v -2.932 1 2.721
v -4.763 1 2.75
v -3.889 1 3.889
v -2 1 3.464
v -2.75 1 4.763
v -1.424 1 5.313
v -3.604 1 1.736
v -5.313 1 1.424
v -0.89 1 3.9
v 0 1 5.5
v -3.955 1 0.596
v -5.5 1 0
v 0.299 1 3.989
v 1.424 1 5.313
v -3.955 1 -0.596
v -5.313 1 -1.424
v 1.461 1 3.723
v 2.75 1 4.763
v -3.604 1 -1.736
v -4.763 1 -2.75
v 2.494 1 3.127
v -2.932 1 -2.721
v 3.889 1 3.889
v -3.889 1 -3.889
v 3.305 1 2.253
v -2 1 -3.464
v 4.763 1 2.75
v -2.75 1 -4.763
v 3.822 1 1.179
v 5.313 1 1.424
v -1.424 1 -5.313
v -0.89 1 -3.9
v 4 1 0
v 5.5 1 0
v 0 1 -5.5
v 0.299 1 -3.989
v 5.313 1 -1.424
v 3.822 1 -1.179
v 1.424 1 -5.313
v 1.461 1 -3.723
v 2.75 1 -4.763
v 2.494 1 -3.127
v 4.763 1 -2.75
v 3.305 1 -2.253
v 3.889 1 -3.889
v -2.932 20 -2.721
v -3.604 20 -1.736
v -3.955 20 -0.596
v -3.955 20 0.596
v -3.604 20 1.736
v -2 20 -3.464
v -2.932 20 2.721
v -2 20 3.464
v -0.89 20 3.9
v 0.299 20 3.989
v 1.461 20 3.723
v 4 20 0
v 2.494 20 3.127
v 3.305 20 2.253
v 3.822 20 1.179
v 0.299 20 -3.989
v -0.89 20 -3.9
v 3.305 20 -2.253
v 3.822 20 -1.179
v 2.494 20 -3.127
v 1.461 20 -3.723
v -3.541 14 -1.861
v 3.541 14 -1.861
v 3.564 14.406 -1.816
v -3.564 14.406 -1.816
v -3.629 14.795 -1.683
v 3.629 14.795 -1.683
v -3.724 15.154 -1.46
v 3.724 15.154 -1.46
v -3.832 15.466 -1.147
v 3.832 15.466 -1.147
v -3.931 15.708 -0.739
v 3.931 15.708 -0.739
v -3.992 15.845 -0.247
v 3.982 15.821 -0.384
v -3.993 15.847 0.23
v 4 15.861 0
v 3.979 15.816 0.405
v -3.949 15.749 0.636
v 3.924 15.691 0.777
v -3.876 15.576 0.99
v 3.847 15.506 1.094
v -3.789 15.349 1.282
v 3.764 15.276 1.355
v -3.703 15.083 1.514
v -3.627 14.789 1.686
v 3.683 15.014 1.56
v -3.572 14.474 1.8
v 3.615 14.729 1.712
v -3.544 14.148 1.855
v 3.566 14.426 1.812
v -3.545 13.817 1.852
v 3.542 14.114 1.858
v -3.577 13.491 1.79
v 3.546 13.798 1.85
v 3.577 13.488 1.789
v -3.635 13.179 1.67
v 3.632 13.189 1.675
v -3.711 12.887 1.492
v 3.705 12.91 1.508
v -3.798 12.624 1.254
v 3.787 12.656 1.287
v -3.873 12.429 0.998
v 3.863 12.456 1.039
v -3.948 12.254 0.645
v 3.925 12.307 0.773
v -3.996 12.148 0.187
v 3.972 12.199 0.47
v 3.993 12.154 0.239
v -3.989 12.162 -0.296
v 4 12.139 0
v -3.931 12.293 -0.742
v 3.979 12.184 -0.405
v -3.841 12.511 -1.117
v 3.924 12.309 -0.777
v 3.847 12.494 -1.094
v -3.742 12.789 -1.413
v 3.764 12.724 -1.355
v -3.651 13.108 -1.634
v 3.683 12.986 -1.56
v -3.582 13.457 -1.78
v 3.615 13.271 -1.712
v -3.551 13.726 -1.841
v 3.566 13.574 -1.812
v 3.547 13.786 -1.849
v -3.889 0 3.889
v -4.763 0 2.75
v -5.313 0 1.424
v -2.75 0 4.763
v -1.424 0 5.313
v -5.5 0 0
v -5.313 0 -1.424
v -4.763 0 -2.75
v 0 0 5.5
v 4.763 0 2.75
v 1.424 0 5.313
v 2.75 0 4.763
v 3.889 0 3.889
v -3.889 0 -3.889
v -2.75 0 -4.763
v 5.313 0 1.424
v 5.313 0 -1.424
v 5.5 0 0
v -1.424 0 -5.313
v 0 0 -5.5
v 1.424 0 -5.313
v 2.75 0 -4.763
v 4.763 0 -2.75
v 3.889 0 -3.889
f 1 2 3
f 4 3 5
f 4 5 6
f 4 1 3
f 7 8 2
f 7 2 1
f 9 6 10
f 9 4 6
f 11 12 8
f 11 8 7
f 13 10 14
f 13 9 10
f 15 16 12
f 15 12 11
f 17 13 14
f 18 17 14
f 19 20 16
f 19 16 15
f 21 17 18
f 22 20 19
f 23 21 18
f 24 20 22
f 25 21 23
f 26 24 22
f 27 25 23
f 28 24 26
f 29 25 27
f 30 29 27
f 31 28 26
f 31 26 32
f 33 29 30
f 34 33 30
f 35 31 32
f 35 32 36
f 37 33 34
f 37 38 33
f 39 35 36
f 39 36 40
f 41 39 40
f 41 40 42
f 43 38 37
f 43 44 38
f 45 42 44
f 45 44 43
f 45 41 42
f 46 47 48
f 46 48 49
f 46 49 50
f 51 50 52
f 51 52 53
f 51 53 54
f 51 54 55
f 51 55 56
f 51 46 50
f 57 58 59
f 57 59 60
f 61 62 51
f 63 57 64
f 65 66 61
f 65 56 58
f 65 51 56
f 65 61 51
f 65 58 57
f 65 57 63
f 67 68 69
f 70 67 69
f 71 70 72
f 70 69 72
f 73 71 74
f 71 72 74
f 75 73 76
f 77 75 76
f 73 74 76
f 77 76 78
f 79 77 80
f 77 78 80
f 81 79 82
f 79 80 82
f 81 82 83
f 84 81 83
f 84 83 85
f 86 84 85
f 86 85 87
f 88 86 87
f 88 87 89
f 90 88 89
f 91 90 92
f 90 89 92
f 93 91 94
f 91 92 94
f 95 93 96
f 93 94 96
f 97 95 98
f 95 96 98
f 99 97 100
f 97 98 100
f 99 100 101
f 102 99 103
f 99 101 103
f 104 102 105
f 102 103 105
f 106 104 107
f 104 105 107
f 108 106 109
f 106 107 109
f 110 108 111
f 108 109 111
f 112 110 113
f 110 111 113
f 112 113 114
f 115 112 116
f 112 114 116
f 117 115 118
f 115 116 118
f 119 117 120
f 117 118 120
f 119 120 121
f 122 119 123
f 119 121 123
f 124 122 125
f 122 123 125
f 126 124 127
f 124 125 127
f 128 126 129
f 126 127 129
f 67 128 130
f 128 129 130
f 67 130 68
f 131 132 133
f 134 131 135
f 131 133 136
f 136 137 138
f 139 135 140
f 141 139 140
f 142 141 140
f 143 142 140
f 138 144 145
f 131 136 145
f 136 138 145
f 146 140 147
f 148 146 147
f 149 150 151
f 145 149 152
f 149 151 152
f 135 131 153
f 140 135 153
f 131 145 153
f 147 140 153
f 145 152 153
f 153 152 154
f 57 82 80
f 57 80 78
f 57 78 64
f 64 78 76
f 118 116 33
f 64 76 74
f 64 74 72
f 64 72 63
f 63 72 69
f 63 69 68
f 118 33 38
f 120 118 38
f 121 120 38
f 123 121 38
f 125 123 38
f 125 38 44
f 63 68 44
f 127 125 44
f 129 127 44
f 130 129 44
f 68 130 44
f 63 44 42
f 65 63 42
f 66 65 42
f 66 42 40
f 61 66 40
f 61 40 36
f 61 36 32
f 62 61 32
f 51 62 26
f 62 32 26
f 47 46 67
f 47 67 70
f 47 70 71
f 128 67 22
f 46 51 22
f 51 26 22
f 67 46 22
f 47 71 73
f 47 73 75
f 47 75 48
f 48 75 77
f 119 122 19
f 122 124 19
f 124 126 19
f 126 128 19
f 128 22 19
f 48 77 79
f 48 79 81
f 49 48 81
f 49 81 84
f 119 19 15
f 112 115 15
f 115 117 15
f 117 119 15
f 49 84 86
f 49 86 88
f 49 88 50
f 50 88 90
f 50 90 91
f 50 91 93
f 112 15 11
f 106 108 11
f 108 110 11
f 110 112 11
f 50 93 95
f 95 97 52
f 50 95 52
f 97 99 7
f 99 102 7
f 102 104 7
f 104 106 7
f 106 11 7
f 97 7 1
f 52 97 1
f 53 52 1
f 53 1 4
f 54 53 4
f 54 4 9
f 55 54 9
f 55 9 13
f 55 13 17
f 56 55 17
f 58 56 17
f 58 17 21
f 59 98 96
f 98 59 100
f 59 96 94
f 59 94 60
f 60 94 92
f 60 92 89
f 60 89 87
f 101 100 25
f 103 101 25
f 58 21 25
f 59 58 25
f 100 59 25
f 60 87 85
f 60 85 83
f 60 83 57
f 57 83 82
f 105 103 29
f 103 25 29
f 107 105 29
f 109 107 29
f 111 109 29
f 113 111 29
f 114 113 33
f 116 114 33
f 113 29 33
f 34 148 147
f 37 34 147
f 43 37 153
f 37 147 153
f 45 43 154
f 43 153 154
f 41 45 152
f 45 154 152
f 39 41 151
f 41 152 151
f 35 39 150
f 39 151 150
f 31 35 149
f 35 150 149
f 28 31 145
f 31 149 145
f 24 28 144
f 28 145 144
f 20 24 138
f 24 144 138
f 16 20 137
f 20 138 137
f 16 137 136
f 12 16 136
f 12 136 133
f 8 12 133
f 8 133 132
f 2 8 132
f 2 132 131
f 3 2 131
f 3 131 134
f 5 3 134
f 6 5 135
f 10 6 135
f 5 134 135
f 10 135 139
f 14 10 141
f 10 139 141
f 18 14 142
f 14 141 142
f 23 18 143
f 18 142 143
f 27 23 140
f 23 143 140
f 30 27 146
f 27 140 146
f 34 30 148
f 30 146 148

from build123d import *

# Parameters (mm, degrees)
SKETCH1_R           = 5.5
SKETCH1_R_2         = 4
BOSS_EXTRUDE1_DEPTH = 1
SKETCH1_2_R         = 4
BOSS_EXTRUDE2_DEPTH = 20
SKETCH2_R           = 1.8611768
CUT_EXTRUDE1_DEPTH  = 12


with BuildPart() as part:
    # Sketch1 → Boss-Extrude1 (new body)
    with BuildSketch(Plane(origin=(0, 0, 0), x_dir=(1, 0, 0), z_dir=(0, 1, 0))):
        Circle(SKETCH1_R)
        Circle(SKETCH1_R_2, mode=Mode.SUBTRACT)
    extrude(amount=BOSS_EXTRUDE1_DEPTH)

    # Sketch1<2> → Boss-Extrude2 (add)
    with BuildSketch(Plane(origin=(0, 0, 0), x_dir=(1, 0, 0), z_dir=(0, 1, 0))):
        Circle(SKETCH1_2_R)
    extrude(amount=BOSS_EXTRUDE2_DEPTH)

    # Sketch2 → Cut-Extrude1 (cut)
    with BuildSketch(Plane(origin=(4, 0, 0), x_dir=(0, 0, -1), z_dir=(1, 0, 0))):
        with Locations((0, 14)):
            Circle(SKETCH2_R)
    extrude(amount=-CUT_EXTRUDE1_DEPTH, mode=Mode.SUBTRACT)


solid = part.part
